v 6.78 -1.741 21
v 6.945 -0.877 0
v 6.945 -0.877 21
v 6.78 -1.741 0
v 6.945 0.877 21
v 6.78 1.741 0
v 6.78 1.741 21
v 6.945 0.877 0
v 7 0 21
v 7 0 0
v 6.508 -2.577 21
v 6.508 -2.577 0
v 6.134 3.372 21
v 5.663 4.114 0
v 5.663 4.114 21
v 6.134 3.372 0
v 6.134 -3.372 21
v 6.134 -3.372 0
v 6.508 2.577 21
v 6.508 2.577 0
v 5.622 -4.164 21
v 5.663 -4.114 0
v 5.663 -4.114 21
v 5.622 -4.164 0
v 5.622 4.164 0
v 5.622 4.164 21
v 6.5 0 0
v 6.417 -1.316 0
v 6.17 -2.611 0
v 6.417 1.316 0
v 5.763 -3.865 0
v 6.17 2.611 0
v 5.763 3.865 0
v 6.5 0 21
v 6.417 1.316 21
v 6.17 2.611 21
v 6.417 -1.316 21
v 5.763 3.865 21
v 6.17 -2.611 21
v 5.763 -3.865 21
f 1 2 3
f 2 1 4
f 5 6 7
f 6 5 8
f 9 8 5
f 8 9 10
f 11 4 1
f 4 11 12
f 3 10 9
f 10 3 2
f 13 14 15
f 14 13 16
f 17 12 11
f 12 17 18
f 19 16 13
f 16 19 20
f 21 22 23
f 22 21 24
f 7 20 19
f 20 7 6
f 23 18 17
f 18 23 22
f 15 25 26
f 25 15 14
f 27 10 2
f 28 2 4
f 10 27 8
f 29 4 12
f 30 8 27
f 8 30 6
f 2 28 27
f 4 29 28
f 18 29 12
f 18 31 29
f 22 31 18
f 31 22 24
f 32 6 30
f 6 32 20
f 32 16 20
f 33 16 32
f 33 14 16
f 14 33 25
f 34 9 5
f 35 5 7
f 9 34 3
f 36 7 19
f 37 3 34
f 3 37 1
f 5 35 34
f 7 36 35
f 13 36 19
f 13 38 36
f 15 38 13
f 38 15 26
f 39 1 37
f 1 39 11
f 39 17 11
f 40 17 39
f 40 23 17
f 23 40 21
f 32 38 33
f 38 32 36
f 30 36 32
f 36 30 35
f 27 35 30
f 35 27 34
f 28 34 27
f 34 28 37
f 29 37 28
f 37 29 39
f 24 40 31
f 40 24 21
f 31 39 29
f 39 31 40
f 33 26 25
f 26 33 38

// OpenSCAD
$fn = 50;


difference() {
	union() {
		cylinder(h = 21, r = 7.0000000000);
		translate(v = [-7.0000000000, 0, 0]) {
			cylinder(h = 21, r = 7.0000000000);
		}
	}
	union() {
		cylinder(h = 21, r = 3.2500000000);
		cylinder(h = 21, r = 1.8000000000);
		cylinder(h = 21, r = 1.8000000000);
		cylinder(h = 21, r = 1.8000000000);
		translate(v = [-11.5000000000, 0, 0]) {
			hull() {
				translate(v = [-3.7500000000, 0.0000000000, 0]) {
					cylinder(h = 21, r = 10.5000000000);
				}
				translate(v = [3.7500000000, 0.0000000000, 0]) {
					cylinder(h = 21, r = 10.5000000000);
				}
				translate(v = [-3.7500000000, -0.0000000000, 0]) {
					cylinder(h = 21, r = 10.5000000000);
				}
				translate(v = [3.7500000000, -0.0000000000, 0]) {
					cylinder(h = 21, r = 10.5000000000);
				}
			}
		}
		translate(v = [-4.0000000000, 0, 0.0000000000]) {
			cylinder(h = 21, r = 10.5000000000);
		}
	}
}
